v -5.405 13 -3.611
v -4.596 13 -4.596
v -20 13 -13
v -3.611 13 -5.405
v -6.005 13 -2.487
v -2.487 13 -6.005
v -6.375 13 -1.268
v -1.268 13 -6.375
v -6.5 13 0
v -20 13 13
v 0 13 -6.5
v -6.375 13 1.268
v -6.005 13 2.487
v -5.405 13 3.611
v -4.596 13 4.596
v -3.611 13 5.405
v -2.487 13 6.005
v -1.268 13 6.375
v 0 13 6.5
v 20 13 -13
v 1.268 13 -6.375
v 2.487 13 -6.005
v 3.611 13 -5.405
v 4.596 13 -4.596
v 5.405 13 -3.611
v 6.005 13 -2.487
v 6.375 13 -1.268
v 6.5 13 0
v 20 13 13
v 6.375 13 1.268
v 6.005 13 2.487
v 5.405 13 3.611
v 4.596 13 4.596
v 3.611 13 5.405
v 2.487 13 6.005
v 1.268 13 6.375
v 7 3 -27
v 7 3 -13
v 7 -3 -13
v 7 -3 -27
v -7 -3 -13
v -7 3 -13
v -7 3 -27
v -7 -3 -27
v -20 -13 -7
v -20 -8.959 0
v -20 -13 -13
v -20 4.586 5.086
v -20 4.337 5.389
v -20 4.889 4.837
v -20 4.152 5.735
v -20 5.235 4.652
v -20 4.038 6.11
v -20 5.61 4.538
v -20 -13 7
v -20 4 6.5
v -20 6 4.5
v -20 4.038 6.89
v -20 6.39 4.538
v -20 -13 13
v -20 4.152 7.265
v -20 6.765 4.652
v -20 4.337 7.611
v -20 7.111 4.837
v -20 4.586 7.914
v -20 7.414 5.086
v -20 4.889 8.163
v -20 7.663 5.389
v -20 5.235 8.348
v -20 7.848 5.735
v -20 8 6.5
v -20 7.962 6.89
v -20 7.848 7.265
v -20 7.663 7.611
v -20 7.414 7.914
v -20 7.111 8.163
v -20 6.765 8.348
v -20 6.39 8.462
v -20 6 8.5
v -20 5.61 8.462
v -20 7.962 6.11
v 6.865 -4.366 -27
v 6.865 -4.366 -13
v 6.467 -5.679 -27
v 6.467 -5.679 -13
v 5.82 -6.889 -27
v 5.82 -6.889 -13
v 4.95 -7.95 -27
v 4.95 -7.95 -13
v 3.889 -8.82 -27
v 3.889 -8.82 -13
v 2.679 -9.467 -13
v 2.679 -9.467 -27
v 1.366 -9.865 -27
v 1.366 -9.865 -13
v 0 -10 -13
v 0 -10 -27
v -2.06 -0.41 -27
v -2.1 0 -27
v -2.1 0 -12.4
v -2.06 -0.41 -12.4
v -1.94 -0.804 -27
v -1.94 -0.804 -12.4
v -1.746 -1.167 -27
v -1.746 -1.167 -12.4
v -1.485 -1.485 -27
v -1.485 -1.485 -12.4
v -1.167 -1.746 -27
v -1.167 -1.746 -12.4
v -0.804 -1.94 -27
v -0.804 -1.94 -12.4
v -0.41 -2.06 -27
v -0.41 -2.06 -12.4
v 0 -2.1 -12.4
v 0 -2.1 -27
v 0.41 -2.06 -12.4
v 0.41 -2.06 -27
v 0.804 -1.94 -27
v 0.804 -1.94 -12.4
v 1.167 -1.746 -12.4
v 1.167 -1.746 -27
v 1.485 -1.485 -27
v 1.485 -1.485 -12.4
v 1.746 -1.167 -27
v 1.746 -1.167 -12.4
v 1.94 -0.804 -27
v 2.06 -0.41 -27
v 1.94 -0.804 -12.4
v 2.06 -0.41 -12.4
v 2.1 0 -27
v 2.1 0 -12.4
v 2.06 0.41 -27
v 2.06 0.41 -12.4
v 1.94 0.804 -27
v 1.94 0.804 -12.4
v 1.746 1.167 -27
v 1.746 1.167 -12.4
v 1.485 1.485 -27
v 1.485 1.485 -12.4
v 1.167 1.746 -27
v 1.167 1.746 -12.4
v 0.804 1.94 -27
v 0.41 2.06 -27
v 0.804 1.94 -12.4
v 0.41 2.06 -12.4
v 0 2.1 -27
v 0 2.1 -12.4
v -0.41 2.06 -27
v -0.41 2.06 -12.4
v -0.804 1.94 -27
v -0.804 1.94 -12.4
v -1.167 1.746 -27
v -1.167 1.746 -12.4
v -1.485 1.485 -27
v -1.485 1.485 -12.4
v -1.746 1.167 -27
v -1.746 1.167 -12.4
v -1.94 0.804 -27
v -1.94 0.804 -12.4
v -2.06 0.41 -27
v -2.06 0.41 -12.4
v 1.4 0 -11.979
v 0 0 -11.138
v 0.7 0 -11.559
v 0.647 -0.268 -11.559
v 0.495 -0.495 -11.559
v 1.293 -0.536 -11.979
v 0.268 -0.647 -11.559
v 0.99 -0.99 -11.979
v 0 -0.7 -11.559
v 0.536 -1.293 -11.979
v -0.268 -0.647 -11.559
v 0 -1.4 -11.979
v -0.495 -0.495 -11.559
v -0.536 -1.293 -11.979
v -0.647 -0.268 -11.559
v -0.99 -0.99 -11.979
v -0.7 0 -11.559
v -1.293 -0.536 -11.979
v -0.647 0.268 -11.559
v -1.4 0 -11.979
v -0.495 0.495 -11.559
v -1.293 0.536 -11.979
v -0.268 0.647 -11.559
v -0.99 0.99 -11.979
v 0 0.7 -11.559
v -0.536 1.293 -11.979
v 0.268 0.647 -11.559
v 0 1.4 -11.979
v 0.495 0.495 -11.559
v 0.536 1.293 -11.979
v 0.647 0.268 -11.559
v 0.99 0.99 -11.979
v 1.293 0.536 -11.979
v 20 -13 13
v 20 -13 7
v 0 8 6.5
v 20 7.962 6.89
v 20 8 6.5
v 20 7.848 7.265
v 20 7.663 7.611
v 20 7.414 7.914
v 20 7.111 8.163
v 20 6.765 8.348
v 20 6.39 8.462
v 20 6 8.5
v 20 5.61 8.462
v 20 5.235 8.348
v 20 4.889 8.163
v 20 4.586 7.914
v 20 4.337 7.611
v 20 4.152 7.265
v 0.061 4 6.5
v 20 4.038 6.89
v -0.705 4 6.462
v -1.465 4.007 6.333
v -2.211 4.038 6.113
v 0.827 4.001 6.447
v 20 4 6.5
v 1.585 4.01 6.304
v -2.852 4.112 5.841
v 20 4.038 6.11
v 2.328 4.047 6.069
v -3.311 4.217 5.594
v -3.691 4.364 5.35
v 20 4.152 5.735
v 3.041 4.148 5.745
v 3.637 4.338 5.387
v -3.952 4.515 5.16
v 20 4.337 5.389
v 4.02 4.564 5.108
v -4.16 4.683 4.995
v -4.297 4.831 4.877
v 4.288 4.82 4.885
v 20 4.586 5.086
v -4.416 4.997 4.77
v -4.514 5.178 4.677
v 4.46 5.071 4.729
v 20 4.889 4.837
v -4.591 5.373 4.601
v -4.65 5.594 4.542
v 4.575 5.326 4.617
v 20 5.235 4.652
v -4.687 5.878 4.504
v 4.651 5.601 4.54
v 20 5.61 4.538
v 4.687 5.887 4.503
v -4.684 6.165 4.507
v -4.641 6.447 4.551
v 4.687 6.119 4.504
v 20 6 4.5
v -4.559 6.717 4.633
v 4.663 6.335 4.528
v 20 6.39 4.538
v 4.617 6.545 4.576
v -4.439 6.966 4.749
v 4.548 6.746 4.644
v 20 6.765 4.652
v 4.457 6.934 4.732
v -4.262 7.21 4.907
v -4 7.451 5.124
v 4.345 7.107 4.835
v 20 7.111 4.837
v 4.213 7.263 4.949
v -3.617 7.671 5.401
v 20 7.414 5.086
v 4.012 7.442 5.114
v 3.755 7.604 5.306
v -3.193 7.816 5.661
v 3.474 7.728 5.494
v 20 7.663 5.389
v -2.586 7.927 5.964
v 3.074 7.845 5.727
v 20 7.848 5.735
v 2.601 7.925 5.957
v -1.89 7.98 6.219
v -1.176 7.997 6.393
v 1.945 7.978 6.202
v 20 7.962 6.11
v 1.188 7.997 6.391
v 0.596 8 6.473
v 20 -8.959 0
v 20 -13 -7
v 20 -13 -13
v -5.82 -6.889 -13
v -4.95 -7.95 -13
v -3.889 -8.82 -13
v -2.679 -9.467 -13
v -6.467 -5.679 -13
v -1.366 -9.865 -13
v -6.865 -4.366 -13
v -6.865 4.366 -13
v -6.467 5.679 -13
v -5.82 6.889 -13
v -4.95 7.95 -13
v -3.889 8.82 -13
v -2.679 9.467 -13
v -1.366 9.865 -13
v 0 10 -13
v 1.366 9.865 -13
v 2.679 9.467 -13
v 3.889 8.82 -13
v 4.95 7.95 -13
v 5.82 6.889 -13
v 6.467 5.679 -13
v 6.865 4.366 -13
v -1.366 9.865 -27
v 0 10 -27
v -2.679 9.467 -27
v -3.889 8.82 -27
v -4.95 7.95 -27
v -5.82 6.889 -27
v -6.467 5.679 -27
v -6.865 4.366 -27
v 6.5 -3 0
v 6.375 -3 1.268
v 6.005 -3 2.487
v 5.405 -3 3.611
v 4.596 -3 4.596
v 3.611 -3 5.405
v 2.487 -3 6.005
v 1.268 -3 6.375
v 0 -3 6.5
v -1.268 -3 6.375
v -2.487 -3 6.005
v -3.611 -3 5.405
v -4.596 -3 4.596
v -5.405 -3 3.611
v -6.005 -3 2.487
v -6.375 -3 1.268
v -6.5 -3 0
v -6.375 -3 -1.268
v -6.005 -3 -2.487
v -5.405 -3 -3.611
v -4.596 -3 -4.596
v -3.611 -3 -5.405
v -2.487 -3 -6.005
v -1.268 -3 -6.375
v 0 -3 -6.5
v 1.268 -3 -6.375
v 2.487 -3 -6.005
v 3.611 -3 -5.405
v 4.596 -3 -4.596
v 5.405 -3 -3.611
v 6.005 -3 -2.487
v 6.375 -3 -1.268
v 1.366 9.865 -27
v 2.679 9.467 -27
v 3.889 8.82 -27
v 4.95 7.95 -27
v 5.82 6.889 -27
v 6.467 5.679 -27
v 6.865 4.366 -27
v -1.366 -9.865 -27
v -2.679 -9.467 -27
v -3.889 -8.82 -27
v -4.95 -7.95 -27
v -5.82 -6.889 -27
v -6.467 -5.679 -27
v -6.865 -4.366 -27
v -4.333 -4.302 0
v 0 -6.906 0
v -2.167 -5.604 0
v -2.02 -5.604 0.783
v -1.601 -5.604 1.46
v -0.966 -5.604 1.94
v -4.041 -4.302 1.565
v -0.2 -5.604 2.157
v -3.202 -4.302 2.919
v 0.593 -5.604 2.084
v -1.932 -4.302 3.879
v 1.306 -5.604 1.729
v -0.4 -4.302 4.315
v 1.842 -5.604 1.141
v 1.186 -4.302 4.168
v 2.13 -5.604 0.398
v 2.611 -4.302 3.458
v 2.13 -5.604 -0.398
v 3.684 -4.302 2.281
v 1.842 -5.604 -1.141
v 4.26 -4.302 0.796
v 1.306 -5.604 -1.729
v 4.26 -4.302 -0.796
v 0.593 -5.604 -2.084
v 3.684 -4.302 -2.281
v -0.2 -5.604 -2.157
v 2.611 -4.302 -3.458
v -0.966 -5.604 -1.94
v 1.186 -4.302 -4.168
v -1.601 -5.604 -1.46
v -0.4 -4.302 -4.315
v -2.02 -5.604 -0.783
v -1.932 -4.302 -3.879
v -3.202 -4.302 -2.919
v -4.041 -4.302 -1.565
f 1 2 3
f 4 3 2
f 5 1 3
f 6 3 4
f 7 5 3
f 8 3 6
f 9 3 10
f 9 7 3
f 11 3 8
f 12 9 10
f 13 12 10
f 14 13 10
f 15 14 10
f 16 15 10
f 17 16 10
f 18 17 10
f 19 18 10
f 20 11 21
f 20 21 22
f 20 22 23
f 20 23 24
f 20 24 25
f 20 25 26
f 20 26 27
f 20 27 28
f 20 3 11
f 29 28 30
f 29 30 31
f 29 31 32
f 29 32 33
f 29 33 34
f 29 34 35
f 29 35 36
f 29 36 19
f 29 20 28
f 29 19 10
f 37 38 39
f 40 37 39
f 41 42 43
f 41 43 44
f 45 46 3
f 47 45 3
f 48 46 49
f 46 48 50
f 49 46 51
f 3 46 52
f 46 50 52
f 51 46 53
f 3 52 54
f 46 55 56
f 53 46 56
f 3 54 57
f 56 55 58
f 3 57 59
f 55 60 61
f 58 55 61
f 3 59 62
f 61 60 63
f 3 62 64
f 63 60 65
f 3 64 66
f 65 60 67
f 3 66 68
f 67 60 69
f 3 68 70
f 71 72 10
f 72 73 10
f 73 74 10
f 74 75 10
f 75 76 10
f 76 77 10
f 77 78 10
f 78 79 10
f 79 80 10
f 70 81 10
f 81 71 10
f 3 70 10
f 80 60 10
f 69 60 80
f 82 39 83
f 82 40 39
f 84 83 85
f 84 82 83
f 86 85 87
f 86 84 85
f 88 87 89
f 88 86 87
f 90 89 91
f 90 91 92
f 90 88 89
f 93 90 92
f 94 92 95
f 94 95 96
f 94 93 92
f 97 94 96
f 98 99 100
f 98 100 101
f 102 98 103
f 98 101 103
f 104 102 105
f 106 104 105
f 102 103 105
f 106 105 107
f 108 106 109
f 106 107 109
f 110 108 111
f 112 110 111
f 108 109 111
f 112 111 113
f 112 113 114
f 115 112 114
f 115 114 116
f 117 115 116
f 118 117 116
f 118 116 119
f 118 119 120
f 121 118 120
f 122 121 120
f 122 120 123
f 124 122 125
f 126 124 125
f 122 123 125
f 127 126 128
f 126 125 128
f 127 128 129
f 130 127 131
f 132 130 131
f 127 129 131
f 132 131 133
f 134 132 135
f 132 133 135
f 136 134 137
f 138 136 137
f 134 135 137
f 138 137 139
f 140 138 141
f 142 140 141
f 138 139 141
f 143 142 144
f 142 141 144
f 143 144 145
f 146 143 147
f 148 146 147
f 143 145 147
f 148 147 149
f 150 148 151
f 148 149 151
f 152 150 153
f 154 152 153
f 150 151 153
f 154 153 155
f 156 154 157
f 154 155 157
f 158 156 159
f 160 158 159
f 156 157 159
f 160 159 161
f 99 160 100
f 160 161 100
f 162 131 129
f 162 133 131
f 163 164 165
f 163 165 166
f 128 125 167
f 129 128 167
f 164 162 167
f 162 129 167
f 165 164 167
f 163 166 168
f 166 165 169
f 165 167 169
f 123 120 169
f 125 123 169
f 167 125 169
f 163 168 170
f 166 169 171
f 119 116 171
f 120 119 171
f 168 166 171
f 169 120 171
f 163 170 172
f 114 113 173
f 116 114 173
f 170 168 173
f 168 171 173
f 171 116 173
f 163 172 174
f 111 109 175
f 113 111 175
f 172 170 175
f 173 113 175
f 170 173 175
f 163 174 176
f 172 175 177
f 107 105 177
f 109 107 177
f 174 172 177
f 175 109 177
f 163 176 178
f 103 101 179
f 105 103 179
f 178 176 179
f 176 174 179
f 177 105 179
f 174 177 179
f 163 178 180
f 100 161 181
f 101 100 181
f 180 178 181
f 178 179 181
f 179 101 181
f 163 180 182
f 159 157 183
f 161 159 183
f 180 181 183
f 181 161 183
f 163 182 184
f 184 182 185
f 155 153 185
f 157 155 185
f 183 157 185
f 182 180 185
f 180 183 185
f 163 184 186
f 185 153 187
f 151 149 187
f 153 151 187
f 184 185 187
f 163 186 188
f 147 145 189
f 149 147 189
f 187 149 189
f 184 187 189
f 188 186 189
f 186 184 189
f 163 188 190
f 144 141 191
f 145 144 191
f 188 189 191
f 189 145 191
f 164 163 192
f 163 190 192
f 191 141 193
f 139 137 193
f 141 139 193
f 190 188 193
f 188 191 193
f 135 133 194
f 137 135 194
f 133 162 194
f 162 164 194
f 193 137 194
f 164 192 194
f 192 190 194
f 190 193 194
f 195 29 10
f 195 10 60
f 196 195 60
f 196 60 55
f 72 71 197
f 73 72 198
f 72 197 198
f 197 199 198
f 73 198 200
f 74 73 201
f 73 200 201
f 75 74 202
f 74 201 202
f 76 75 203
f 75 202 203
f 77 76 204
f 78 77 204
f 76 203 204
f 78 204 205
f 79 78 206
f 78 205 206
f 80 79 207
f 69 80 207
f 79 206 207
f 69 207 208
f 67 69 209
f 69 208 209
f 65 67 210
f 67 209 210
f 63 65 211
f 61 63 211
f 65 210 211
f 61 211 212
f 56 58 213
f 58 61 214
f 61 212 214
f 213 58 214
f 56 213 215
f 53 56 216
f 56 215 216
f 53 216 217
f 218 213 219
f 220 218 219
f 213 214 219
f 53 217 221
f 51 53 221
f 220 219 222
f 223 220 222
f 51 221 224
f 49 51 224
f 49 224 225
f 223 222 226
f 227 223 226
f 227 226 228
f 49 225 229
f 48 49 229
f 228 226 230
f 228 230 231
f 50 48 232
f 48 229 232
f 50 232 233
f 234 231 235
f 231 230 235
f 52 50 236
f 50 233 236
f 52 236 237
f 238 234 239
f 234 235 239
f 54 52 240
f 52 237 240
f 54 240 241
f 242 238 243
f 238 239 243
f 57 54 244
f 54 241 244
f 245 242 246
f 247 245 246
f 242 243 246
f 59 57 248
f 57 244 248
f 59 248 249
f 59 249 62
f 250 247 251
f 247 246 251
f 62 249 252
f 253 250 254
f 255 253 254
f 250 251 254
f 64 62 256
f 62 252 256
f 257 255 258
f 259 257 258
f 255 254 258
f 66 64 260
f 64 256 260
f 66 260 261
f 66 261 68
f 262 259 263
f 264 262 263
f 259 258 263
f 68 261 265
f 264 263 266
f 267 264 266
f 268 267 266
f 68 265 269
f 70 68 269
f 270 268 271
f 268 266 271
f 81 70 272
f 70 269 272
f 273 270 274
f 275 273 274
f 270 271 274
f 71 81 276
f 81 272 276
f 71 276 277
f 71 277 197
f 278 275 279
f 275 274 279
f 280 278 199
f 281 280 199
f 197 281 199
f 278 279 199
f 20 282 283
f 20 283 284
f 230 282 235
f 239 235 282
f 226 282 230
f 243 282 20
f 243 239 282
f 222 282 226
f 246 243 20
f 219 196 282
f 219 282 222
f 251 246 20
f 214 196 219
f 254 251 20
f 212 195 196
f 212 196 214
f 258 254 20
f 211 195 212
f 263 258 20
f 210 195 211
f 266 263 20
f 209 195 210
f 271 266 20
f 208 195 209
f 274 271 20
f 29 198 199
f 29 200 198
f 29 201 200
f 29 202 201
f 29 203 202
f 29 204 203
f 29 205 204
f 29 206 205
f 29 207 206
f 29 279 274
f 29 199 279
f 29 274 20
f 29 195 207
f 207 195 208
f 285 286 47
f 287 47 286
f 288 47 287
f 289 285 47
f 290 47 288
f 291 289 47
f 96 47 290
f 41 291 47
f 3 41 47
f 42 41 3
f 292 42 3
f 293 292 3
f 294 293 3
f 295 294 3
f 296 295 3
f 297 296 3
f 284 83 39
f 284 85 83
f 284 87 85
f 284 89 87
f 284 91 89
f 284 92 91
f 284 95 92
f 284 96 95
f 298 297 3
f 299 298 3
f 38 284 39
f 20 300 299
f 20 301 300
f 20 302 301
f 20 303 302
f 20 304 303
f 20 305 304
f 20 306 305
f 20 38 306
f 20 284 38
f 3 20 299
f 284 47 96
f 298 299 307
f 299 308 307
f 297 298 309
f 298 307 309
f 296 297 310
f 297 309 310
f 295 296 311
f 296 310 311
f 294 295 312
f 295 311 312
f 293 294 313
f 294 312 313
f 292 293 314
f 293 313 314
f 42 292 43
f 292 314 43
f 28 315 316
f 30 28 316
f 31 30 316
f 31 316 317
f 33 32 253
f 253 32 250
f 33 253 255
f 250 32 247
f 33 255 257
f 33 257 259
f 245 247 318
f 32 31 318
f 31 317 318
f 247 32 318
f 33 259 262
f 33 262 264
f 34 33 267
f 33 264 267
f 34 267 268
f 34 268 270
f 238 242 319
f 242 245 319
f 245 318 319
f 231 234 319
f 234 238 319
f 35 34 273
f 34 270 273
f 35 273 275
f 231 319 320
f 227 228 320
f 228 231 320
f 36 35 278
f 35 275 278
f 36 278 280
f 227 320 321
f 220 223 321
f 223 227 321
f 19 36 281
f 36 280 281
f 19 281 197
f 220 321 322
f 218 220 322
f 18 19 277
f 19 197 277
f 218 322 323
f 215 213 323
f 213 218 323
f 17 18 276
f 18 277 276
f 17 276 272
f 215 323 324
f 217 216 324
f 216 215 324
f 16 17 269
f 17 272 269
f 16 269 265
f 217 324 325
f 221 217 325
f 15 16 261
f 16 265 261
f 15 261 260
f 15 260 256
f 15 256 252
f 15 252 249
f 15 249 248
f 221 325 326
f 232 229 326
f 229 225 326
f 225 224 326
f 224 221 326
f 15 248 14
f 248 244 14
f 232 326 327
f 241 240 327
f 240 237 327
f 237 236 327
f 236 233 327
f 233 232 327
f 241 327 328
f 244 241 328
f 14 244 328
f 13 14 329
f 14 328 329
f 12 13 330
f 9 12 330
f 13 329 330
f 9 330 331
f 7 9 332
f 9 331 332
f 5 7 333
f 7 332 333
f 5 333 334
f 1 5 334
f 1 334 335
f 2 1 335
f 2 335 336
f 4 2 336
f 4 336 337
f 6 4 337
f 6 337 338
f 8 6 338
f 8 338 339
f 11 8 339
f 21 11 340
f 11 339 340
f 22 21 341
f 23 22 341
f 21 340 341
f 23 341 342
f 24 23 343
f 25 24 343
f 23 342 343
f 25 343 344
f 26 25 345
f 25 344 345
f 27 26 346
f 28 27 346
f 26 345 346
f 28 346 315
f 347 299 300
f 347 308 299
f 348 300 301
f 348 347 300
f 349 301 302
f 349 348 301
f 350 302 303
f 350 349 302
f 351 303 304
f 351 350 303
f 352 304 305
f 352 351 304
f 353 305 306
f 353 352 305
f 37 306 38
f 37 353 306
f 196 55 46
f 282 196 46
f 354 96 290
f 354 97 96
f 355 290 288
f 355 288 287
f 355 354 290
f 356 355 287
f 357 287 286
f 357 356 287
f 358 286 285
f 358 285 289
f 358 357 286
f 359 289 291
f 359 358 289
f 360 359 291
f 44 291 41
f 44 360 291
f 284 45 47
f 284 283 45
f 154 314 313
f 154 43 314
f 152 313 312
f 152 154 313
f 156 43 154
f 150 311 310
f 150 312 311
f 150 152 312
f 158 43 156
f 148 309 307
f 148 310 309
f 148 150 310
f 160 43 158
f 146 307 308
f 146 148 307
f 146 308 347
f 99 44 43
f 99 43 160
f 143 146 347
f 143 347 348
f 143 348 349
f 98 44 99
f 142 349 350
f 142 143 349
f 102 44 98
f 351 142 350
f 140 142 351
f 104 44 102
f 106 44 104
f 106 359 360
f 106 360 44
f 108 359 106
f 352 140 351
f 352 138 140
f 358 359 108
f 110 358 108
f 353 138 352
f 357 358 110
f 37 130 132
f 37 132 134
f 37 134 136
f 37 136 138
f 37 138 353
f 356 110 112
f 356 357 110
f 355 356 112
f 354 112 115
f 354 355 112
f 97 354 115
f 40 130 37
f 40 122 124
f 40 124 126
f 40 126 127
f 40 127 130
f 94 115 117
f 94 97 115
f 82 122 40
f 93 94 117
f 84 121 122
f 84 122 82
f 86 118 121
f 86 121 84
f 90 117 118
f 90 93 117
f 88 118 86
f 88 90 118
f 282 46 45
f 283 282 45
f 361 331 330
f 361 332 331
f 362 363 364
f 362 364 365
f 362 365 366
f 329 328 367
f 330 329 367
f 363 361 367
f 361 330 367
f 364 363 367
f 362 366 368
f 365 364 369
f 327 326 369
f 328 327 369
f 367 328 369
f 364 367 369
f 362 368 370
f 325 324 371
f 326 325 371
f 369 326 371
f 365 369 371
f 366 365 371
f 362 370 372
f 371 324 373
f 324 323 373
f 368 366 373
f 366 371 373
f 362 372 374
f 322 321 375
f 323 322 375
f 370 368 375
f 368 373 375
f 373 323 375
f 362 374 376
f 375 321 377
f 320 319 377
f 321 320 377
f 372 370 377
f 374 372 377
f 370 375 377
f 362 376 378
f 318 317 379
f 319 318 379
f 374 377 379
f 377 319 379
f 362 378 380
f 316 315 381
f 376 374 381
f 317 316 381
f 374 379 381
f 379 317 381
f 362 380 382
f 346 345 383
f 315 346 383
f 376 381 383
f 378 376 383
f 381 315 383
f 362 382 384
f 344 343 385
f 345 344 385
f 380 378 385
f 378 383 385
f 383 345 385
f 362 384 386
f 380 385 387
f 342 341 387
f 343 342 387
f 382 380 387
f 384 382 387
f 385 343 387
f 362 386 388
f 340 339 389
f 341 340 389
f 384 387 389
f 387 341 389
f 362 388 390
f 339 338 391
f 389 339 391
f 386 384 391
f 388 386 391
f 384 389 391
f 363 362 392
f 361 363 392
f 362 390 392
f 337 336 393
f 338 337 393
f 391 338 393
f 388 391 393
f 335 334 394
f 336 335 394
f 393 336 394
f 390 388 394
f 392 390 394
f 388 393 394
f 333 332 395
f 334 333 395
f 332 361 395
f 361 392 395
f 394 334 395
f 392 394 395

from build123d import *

# Parameters (mm, degrees)
F1_DEPTH  = 20
F2_W      = 14
F2_H      = 20
F3_DEPTH  = 14
F4_R      = 6.99999
F6_D      = 13
F6_DEPTH  = 16
F6_TIP    = 3.9055940237
F7_R      = 2
F8_DEPTH  = 20
F10_D     = 4.2
F10_DEPTH = 14.6
F10_TIP   = 1.2618073


# Not quite as in the source:
# - a fillet or chamfer is up to 0.001 mm smaller than in the source, because OpenCascade refuses the exact size


with BuildPart() as f1:
    # F0 (on Right) → F1 (new body, symmetric)
    with BuildSketch(Plane.YZ):
        Polygon((-13, -13), (13, -13), (13, 13), (-13, 13), (-13, 7), (-8.9585481157, 0), (-13, -7), align=None)
    extrude(amount=F1_DEPTH, both=True)

    # F2 (on face) → F3 (join)
    with BuildSketch(Plane(origin=(0, 0, -13), x_dir=(1, 0, 0), z_dir=(0, 0, -1))):
        Rectangle(F2_W, F2_H)
    extrude(amount=F3_DEPTH)

    # F4 (radius 7 in the source; OpenCascade refuses exactly that, so slightly less here)
    f4_edges = [f1.edges().sort_by_distance(p)[0] for p in [
        (7, -10, -20),
        (-7, -10, -20),
        (7, 10, -20),
        (-7, 10, -20),
    ]]
    fillet(f4_edges, radius=F4_R)

    # F6
    with Locations(Plane(origin=(0, 13, 0), x_dir=(-1, 0, 0), z_dir=(0, 1, 0))):
        with Locations((0, 0)):
            Hole(F6_D / 2, depth=F6_DEPTH)
            with Locations((0, 0, -(F6_DEPTH + F6_TIP / 2))):  # 118° drill point
                Cone(0, F6_D / 2, F6_TIP, mode=Mode.SUBTRACT)

    # F7 (on Right) → F8 (cut, symmetric)
    with BuildSketch(Plane.YZ):
        with Locations((6, 6.5)):
            Circle(F7_R)
    extrude(amount=F8_DEPTH, both=True, mode=Mode.SUBTRACT)

    # F10
    with Locations(Plane(origin=(0, 0, -27), x_dir=(1, 0, 0), z_dir=(0, 0, -1))):
        with Locations((0, 0)):
            Hole(F10_D / 2, depth=F10_DEPTH)
            with Locations((0, 0, -(F10_DEPTH + F10_TIP / 2))):  # 118° drill point
                Cone(0, F10_D / 2, F10_TIP, mode=Mode.SUBTRACT)


solid = f1.part
